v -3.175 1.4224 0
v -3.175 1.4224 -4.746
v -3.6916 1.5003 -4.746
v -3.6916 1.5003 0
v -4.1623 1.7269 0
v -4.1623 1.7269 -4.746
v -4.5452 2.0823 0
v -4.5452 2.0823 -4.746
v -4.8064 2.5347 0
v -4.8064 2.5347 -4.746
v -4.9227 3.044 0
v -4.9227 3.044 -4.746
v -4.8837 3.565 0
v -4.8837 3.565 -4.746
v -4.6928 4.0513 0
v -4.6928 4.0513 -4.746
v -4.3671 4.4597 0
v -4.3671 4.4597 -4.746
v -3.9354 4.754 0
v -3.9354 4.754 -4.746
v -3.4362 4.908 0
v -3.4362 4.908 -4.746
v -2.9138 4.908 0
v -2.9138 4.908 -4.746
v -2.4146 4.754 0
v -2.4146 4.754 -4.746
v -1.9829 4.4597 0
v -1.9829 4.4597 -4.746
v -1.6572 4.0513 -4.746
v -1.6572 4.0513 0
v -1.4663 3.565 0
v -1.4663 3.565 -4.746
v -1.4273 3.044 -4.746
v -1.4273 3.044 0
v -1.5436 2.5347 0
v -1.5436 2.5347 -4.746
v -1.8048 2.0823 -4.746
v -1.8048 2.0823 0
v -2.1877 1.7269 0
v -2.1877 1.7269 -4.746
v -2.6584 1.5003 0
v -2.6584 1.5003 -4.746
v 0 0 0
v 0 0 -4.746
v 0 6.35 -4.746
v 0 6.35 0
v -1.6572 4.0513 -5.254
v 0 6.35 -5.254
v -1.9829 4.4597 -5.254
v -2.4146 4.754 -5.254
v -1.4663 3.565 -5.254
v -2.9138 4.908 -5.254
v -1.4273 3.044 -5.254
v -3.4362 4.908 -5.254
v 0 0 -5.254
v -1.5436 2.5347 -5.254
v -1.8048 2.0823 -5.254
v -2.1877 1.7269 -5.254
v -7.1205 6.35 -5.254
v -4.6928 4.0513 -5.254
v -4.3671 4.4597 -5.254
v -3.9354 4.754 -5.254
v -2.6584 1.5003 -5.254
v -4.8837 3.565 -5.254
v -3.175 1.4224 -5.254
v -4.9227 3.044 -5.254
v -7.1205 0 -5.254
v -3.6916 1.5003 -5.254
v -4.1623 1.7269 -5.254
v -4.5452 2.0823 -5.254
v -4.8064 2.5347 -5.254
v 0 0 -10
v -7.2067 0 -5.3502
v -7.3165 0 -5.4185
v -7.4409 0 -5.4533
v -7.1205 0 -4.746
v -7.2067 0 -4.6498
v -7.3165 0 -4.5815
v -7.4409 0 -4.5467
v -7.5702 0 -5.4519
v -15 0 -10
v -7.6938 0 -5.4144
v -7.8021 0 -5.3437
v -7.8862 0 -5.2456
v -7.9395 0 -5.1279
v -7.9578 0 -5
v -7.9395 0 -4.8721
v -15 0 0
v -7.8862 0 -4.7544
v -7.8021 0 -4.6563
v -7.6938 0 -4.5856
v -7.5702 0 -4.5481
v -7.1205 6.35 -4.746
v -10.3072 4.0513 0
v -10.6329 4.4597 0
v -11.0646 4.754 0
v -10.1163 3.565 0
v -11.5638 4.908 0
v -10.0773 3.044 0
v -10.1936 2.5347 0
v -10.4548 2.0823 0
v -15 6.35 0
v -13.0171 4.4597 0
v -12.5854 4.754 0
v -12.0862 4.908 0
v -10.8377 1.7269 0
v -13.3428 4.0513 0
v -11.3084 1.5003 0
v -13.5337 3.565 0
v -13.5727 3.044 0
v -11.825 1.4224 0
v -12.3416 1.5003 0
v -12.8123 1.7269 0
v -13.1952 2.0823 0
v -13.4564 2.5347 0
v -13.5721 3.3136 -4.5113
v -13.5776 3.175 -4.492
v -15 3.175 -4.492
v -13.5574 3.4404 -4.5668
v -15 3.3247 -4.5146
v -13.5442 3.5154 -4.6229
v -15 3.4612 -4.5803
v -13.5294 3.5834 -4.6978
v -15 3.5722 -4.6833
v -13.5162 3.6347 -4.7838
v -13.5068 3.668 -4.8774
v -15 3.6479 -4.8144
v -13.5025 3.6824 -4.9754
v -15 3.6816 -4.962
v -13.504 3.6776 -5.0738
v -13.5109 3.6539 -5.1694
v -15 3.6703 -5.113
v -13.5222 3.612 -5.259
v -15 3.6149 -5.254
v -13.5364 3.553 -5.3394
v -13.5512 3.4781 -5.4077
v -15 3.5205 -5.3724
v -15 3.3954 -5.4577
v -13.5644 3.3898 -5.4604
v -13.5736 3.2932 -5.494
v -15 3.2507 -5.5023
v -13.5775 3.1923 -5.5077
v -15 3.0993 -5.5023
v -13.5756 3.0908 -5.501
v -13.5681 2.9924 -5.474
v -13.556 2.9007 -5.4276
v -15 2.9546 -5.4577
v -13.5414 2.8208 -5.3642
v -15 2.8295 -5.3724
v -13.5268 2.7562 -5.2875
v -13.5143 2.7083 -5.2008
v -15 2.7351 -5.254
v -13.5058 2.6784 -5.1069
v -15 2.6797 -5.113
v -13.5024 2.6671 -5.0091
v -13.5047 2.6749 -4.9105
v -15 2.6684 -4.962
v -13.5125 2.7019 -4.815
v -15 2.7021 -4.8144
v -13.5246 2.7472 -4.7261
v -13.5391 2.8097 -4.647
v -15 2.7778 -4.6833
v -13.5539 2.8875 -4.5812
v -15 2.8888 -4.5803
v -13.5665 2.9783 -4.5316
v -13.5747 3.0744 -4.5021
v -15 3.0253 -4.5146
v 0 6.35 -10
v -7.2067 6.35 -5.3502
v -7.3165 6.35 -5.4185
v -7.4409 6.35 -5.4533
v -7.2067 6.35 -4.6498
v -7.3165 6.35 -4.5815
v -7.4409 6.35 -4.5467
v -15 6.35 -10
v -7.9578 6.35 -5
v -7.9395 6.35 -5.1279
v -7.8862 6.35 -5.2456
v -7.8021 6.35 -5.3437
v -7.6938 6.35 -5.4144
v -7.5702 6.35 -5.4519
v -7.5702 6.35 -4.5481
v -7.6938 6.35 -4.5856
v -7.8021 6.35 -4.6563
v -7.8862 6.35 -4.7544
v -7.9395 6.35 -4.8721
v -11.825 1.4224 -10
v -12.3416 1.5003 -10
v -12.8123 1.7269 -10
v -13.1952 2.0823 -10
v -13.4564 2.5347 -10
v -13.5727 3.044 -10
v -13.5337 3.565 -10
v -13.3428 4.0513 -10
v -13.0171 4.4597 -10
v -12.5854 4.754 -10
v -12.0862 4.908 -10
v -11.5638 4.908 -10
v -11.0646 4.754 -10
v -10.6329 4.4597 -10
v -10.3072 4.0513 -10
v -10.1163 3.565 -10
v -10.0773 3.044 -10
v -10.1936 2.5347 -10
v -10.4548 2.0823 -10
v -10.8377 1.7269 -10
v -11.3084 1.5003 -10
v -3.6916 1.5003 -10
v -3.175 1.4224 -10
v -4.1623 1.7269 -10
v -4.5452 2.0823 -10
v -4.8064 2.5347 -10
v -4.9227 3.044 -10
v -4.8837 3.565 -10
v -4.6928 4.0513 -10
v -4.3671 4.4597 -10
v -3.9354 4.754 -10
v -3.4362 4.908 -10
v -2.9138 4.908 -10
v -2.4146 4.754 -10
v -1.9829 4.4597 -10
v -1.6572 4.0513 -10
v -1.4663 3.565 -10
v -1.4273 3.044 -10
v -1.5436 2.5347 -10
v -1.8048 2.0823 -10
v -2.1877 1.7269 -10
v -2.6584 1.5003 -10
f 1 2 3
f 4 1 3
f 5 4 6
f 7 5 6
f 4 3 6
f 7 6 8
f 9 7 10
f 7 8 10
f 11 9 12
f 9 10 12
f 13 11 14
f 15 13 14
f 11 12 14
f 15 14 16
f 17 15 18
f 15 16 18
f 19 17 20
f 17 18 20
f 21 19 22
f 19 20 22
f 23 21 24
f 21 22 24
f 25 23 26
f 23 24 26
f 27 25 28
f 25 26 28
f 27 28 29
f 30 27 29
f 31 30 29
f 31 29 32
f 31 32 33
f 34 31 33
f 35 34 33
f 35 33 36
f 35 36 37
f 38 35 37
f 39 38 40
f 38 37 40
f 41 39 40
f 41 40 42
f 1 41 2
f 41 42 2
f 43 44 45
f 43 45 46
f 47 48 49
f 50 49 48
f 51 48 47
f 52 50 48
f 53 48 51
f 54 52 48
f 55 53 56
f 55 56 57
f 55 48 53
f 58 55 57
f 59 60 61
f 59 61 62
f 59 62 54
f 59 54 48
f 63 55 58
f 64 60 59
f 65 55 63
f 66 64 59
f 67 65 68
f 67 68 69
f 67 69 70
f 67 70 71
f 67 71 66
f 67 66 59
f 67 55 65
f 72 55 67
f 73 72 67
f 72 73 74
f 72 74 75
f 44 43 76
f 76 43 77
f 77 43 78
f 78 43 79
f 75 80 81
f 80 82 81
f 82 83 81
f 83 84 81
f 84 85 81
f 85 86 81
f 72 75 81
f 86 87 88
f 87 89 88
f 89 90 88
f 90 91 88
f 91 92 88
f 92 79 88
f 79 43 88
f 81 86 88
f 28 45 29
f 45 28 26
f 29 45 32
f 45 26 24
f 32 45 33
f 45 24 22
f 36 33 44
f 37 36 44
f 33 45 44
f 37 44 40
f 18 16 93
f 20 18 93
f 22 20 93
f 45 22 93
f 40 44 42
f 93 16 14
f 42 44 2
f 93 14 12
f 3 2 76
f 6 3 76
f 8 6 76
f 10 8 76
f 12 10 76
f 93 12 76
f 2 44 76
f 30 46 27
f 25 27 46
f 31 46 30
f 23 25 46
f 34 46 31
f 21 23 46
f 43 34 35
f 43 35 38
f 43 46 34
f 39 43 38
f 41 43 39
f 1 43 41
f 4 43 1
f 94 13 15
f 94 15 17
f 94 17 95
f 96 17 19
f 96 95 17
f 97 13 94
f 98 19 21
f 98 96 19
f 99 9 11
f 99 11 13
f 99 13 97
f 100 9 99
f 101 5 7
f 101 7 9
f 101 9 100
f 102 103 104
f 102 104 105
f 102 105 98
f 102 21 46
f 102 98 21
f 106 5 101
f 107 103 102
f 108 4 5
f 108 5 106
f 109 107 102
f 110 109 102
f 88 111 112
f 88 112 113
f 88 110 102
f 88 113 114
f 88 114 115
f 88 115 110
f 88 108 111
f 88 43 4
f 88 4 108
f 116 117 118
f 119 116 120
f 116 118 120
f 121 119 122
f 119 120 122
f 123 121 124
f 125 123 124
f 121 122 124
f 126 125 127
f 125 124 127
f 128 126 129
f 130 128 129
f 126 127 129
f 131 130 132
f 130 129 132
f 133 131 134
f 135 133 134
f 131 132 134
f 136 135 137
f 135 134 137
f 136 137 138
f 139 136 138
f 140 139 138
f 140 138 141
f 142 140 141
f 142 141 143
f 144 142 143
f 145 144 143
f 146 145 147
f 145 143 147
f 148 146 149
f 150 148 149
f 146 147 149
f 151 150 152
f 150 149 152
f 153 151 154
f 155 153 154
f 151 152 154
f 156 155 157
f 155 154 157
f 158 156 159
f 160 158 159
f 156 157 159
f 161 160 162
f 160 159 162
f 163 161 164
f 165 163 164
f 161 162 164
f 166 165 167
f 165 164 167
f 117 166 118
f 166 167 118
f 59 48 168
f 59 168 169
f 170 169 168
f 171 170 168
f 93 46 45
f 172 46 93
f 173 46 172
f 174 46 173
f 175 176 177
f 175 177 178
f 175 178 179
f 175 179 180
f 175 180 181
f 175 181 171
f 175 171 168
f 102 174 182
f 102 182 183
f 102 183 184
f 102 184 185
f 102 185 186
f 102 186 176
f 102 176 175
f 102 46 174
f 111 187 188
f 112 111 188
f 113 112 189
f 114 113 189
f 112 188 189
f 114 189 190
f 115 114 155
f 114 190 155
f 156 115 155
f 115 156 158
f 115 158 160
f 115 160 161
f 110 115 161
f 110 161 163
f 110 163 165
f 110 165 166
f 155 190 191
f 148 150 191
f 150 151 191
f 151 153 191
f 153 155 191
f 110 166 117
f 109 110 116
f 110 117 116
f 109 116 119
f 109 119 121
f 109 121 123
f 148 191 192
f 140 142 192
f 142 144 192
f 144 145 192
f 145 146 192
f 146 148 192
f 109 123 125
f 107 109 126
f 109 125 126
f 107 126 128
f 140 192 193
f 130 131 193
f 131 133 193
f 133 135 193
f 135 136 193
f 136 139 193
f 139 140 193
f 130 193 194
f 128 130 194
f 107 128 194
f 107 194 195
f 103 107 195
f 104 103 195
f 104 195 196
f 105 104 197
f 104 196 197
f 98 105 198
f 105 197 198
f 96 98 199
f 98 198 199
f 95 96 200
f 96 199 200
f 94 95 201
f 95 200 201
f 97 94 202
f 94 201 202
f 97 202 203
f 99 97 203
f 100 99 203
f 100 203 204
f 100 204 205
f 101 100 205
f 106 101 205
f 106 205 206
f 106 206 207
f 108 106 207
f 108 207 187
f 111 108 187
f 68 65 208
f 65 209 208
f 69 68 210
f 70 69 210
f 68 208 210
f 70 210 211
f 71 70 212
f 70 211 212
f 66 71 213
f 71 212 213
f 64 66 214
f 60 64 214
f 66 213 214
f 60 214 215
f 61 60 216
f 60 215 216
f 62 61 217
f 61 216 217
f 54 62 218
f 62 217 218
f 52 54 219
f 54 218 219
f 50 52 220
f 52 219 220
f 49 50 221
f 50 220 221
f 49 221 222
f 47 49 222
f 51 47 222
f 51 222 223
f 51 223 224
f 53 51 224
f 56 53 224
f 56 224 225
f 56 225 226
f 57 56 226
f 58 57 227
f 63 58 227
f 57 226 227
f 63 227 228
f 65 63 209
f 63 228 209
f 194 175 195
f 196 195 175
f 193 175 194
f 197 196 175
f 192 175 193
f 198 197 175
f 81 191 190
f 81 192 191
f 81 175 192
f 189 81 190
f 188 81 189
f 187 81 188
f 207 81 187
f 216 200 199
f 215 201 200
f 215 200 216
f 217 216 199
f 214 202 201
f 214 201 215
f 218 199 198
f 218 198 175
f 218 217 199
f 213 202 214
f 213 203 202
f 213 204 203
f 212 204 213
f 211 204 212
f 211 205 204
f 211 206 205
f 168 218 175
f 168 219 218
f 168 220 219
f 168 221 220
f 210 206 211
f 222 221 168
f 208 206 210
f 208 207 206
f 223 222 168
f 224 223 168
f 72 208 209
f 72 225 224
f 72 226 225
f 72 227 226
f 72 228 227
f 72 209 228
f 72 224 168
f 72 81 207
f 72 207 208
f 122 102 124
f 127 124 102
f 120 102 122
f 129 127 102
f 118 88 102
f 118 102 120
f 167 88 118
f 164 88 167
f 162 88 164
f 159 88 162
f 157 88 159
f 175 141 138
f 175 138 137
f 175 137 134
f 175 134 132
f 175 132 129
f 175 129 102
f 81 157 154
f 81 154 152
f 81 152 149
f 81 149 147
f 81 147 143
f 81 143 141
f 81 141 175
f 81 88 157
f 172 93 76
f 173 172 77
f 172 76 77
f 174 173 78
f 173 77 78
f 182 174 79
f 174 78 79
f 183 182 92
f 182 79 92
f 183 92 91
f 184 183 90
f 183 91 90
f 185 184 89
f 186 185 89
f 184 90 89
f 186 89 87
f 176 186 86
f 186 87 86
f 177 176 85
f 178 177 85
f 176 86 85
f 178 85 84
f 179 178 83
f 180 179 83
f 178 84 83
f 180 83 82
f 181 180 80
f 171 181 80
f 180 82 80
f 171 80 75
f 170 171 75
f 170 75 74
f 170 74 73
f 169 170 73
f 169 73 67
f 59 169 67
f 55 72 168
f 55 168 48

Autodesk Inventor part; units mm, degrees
ref_plane "YZ Plane" through (0, 0, 0) normal (1, 0, 0) x (0, 1, 0)
ref_plane "XZ Plane" through (0, 0, 0) normal (0, 1, 0) x (-1, 0, 0)
ref_plane "XY Plane" through (0, 0, 0) normal (0, 0, 1) x (1, 0, 0)
sketch "Sketch1" plane through (0, 0, 0) normal (0, 1, 0) x (-1, 0, 0)
  line L0 (0, 0) -> (15, 0)
  line L1 (15, 0) -> (15, -10)
  line L2 (15, -10) -> (0, -10)
  line L3 (0, -10) -> (0, 0)
  line L4 (0, -5) -> (7.5006, -5)
  circle A0 centre (7.5006, -5) radius 0.4572
  line L5 (0, -5.254) -> (7.1205, -5.254)
  line L6 (0, -4.746) -> (7.1205, -4.746)
  dimension "d0" = 15
  dimension "d1" = 10
  dimension "d2" = 7.5006
  dimension "d3" = 0.9144
  dimension "d4" = 0.254
  dimension "d5" = 0.254
extrude "Extrusion1" add sketch "Sketch1" along normal blind 6.35 contours L0 L1 L2 L3 L5 A0 L6
sketch "Sketch2" plane through (-15, 0, 0) normal (0, 0, 1) x (1, 0, 0)
  line L0 (7.8795, 0) -> (15, 0) projected
  line L1 (15, 0) -> (8.65, 6.35)
  line L2 (15, 6.35) -> (7.8795, 6.35) projected
  line L3 (15, 0) -> (23.9803, 0) construction
  circle A0 centre (11.825, 3.175) radius 1.7526
  line L4 (15, 0) -> (0, 0) projected
  line L5 (0, 0) -> (6.35, 6.35)
  line L6 (7.0422, 6.35) -> (7.8795, 6.35) projected
  line L7 (0, 0) -> (8.9803, 0) construction
  circle A1 centre (3.175, 3.175) radius 1.7526
  dimension "d8" = 135
  dimension "d9" = 3.5052
  dimension "d10" = 45
  dimension "d11" = 3.5052
hole "Hole1" at (-11.825, 3.175, 0) direction (0, 0, -1) diameter 3.5052 end through all
hole "Hole2" at (-3.175, 3.175, 0) direction (0, 0, -1) diameter 3.5052 end through all
thread "Thread1" size "6-32 UNC" class "2B" standard "ANSI Unified Screw Threads" full length
thread "Thread2" size "6-32 UNC" class "2B" standard "ANSI Unified Screw Threads" full length
sketch "Sketch3" plane through (-15, 0, -10) normal (-1, 0, 0) x (0, 0, 1)
  line L0 (0, 6.35) -> (10, 6.35) projected
  line L1 (0, 6.35) -> (10, 0)
  circle A0 centre (5, 3.175) radius 0.508
  dimension "d30" = 1.016
extrude "Extrusion2" cut sketch "Sketch3" against normal blind 3.5001
properties part number "clamp(6-32)"
